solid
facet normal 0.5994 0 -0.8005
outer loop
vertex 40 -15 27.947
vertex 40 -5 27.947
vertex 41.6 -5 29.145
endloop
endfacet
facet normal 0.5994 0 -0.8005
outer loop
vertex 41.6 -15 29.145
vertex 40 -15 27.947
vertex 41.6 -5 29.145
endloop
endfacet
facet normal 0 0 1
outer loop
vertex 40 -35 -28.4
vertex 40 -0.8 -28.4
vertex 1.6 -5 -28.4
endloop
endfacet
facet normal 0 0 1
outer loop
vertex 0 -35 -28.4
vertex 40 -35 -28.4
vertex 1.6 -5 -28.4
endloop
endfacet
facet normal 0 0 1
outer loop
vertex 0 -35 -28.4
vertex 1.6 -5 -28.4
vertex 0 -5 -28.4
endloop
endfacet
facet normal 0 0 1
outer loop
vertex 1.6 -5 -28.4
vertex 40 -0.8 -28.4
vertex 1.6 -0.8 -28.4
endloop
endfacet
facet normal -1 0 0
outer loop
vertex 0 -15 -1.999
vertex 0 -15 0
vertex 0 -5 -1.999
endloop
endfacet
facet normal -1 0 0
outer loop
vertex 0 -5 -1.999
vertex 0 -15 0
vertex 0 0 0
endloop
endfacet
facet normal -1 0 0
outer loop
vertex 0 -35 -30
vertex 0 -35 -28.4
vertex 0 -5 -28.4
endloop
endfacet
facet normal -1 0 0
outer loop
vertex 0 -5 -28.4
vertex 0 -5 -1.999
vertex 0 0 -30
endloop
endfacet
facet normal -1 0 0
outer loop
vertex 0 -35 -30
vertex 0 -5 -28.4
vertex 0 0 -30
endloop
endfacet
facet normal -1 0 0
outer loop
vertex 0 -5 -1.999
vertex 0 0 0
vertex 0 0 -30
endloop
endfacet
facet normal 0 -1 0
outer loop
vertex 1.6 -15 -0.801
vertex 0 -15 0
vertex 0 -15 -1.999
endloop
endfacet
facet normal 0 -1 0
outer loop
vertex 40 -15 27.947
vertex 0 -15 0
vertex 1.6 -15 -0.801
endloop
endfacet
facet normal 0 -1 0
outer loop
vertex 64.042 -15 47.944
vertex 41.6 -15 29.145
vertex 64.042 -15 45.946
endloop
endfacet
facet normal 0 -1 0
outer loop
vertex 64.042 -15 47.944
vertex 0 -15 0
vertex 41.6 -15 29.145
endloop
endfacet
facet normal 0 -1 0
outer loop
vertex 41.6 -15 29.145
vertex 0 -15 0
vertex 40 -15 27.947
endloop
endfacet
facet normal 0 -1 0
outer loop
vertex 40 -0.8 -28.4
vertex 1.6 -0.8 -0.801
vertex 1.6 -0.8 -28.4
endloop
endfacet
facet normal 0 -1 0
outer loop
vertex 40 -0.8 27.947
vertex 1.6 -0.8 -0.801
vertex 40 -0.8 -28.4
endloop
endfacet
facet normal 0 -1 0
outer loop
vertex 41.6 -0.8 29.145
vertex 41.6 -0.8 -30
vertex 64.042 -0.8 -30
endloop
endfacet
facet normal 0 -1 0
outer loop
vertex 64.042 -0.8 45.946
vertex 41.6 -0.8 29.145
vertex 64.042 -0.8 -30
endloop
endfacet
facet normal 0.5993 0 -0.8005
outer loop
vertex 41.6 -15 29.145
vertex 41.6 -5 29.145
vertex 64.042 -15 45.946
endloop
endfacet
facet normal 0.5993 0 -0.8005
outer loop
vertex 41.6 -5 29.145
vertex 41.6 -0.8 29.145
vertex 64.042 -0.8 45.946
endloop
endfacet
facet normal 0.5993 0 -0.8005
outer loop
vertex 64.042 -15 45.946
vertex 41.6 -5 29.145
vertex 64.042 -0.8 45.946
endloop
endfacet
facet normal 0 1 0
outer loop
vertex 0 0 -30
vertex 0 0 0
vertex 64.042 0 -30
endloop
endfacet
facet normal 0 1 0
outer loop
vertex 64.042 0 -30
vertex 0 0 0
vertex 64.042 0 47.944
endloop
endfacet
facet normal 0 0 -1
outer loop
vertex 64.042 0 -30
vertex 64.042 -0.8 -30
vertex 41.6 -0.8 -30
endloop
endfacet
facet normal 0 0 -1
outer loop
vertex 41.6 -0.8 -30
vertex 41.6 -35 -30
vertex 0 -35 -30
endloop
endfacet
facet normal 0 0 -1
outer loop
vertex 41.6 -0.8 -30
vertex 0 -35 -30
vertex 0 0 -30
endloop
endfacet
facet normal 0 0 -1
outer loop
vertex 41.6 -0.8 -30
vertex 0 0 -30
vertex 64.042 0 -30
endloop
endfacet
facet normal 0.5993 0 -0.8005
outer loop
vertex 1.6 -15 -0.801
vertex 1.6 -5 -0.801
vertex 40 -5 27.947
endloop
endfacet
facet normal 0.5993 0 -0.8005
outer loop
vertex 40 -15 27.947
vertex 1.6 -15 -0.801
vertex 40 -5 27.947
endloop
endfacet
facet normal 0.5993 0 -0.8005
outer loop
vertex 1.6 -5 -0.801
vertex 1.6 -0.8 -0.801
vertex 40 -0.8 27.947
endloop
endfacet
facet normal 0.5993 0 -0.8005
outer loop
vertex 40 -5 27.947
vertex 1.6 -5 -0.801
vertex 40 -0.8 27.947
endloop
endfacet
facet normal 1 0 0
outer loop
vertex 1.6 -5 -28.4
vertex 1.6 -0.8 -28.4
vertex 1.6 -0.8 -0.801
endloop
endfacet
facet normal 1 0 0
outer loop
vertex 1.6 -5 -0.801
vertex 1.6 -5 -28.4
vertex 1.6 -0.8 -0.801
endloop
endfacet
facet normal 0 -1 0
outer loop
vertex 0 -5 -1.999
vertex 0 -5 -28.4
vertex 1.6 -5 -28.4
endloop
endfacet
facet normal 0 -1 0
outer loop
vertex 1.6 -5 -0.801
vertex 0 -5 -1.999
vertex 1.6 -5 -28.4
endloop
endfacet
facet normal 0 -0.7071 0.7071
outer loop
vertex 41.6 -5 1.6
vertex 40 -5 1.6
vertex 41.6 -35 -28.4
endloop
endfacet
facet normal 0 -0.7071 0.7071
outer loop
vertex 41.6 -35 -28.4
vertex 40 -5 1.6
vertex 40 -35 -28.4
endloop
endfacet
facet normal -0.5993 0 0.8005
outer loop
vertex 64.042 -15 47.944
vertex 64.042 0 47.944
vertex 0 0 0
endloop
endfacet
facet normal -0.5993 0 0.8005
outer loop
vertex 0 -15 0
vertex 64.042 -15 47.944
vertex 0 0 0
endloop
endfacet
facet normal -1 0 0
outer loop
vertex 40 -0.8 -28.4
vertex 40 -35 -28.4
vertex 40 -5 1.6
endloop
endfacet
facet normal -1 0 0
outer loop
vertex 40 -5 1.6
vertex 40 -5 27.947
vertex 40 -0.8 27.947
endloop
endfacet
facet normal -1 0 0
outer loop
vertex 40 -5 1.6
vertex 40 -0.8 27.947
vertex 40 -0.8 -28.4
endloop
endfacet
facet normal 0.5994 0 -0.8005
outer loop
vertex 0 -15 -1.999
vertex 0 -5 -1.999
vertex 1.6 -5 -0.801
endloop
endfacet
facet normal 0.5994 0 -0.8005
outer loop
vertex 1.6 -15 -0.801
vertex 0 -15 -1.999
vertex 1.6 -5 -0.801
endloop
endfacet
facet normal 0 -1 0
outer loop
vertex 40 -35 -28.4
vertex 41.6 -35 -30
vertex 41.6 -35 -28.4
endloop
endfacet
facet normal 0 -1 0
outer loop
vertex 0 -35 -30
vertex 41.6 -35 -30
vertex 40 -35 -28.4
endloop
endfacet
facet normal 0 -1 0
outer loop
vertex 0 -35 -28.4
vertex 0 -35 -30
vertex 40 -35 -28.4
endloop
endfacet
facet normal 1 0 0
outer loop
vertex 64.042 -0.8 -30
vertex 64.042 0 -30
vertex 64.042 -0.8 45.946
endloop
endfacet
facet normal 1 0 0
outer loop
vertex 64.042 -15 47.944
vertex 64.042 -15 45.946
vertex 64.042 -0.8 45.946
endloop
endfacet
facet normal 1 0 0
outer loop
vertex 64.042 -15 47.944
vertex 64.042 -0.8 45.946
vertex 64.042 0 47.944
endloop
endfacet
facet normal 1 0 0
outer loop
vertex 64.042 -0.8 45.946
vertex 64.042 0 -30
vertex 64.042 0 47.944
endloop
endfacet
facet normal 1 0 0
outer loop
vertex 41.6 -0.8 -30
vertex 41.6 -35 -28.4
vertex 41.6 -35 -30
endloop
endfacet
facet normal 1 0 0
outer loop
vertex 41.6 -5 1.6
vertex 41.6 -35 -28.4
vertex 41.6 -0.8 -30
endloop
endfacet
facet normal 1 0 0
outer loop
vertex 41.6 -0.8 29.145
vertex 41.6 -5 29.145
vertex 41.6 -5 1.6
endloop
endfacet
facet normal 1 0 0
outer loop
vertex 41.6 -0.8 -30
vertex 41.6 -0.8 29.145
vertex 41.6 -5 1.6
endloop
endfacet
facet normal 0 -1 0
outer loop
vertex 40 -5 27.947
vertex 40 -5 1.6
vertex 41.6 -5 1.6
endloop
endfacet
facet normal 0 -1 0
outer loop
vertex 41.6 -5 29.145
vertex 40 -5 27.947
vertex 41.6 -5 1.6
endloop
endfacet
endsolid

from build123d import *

# Parameters (mm, degrees)
F1_DEPTH = 0.8
F2_DEPTH = 35
F3_DEPTH = 15
F4_DEPTH = 5
F5_W     = 30
F5_H     = 1.6
F6_DEPTH = 1.6


with BuildPart() as f1:
    # F0 (on Front) → F1 (new body)
    with BuildSketch(Plane.XZ):
        Polygon((64.041778, -30), (64.041778, 45.94555), (41.6, 29.144735), (41.6, -30), align=None)
        Polygon((1.6, -0.800871), (0, -1.998695), (0, -28.4), (1.6, -28.4), align=None)
        Polygon((1.6, -28.4), (0, -28.4), (0, -30), (40, -30), (40, -28.4), align=None)
        Polygon((64.041778, 47.944246), (0, 0), (0, -1.998695), (1.6, -0.800871), (40, 27.94691), (41.6, 29.144735), (64.041778, 45.94555), align=None)
        Polygon((41.6, -30), (41.6, 29.144735), (40, 27.94691), (40, -28.4), (40, -30), align=None)
        Polygon((40, 27.94691), (1.6, -0.800871), (1.6, -28.4), (40, -28.4), align=None)
    extrude(amount=F1_DEPTH)

    # F0 (on Front) → F2 (join)
    with BuildSketch(Plane.XZ):
        Polygon((1.6, -28.4), (0, -28.4), (0, -30), (40, -30), (40, -28.4), align=None)
    extrude(amount=F2_DEPTH)

    # F0 (on Front) → F3 (join)
    with BuildSketch(Plane.XZ):
        Polygon((64.041778, 47.944246), (0, 0), (0, -1.998695), (1.6, -0.800871), (40, 27.94691), (41.6, 29.144735), (64.041778, 45.94555), align=None)
    extrude(amount=F3_DEPTH)

    # F0 (on Front) → F4 (join)
    with BuildSketch(Plane.XZ):
        Polygon((41.6, -30), (41.6, 29.144735), (40, 27.94691), (40, -28.4), (40, -30), align=None)
        Polygon((1.6, -0.800871), (0, -1.998695), (0, -28.4), (1.6, -28.4), align=None)
    extrude(amount=F4_DEPTH)

    # F5 (on face) → F6 (join)
    with BuildSketch(Plane.YZ.offset(40)):
        with Locations((-20, -29.2)):
            Rectangle(F5_W, F5_H)
        Polygon((-5, 1.6), (-35, -28.4), (-5, -28.4), align=None)
    extrude(amount=F6_DEPTH)


solid = f1.part
